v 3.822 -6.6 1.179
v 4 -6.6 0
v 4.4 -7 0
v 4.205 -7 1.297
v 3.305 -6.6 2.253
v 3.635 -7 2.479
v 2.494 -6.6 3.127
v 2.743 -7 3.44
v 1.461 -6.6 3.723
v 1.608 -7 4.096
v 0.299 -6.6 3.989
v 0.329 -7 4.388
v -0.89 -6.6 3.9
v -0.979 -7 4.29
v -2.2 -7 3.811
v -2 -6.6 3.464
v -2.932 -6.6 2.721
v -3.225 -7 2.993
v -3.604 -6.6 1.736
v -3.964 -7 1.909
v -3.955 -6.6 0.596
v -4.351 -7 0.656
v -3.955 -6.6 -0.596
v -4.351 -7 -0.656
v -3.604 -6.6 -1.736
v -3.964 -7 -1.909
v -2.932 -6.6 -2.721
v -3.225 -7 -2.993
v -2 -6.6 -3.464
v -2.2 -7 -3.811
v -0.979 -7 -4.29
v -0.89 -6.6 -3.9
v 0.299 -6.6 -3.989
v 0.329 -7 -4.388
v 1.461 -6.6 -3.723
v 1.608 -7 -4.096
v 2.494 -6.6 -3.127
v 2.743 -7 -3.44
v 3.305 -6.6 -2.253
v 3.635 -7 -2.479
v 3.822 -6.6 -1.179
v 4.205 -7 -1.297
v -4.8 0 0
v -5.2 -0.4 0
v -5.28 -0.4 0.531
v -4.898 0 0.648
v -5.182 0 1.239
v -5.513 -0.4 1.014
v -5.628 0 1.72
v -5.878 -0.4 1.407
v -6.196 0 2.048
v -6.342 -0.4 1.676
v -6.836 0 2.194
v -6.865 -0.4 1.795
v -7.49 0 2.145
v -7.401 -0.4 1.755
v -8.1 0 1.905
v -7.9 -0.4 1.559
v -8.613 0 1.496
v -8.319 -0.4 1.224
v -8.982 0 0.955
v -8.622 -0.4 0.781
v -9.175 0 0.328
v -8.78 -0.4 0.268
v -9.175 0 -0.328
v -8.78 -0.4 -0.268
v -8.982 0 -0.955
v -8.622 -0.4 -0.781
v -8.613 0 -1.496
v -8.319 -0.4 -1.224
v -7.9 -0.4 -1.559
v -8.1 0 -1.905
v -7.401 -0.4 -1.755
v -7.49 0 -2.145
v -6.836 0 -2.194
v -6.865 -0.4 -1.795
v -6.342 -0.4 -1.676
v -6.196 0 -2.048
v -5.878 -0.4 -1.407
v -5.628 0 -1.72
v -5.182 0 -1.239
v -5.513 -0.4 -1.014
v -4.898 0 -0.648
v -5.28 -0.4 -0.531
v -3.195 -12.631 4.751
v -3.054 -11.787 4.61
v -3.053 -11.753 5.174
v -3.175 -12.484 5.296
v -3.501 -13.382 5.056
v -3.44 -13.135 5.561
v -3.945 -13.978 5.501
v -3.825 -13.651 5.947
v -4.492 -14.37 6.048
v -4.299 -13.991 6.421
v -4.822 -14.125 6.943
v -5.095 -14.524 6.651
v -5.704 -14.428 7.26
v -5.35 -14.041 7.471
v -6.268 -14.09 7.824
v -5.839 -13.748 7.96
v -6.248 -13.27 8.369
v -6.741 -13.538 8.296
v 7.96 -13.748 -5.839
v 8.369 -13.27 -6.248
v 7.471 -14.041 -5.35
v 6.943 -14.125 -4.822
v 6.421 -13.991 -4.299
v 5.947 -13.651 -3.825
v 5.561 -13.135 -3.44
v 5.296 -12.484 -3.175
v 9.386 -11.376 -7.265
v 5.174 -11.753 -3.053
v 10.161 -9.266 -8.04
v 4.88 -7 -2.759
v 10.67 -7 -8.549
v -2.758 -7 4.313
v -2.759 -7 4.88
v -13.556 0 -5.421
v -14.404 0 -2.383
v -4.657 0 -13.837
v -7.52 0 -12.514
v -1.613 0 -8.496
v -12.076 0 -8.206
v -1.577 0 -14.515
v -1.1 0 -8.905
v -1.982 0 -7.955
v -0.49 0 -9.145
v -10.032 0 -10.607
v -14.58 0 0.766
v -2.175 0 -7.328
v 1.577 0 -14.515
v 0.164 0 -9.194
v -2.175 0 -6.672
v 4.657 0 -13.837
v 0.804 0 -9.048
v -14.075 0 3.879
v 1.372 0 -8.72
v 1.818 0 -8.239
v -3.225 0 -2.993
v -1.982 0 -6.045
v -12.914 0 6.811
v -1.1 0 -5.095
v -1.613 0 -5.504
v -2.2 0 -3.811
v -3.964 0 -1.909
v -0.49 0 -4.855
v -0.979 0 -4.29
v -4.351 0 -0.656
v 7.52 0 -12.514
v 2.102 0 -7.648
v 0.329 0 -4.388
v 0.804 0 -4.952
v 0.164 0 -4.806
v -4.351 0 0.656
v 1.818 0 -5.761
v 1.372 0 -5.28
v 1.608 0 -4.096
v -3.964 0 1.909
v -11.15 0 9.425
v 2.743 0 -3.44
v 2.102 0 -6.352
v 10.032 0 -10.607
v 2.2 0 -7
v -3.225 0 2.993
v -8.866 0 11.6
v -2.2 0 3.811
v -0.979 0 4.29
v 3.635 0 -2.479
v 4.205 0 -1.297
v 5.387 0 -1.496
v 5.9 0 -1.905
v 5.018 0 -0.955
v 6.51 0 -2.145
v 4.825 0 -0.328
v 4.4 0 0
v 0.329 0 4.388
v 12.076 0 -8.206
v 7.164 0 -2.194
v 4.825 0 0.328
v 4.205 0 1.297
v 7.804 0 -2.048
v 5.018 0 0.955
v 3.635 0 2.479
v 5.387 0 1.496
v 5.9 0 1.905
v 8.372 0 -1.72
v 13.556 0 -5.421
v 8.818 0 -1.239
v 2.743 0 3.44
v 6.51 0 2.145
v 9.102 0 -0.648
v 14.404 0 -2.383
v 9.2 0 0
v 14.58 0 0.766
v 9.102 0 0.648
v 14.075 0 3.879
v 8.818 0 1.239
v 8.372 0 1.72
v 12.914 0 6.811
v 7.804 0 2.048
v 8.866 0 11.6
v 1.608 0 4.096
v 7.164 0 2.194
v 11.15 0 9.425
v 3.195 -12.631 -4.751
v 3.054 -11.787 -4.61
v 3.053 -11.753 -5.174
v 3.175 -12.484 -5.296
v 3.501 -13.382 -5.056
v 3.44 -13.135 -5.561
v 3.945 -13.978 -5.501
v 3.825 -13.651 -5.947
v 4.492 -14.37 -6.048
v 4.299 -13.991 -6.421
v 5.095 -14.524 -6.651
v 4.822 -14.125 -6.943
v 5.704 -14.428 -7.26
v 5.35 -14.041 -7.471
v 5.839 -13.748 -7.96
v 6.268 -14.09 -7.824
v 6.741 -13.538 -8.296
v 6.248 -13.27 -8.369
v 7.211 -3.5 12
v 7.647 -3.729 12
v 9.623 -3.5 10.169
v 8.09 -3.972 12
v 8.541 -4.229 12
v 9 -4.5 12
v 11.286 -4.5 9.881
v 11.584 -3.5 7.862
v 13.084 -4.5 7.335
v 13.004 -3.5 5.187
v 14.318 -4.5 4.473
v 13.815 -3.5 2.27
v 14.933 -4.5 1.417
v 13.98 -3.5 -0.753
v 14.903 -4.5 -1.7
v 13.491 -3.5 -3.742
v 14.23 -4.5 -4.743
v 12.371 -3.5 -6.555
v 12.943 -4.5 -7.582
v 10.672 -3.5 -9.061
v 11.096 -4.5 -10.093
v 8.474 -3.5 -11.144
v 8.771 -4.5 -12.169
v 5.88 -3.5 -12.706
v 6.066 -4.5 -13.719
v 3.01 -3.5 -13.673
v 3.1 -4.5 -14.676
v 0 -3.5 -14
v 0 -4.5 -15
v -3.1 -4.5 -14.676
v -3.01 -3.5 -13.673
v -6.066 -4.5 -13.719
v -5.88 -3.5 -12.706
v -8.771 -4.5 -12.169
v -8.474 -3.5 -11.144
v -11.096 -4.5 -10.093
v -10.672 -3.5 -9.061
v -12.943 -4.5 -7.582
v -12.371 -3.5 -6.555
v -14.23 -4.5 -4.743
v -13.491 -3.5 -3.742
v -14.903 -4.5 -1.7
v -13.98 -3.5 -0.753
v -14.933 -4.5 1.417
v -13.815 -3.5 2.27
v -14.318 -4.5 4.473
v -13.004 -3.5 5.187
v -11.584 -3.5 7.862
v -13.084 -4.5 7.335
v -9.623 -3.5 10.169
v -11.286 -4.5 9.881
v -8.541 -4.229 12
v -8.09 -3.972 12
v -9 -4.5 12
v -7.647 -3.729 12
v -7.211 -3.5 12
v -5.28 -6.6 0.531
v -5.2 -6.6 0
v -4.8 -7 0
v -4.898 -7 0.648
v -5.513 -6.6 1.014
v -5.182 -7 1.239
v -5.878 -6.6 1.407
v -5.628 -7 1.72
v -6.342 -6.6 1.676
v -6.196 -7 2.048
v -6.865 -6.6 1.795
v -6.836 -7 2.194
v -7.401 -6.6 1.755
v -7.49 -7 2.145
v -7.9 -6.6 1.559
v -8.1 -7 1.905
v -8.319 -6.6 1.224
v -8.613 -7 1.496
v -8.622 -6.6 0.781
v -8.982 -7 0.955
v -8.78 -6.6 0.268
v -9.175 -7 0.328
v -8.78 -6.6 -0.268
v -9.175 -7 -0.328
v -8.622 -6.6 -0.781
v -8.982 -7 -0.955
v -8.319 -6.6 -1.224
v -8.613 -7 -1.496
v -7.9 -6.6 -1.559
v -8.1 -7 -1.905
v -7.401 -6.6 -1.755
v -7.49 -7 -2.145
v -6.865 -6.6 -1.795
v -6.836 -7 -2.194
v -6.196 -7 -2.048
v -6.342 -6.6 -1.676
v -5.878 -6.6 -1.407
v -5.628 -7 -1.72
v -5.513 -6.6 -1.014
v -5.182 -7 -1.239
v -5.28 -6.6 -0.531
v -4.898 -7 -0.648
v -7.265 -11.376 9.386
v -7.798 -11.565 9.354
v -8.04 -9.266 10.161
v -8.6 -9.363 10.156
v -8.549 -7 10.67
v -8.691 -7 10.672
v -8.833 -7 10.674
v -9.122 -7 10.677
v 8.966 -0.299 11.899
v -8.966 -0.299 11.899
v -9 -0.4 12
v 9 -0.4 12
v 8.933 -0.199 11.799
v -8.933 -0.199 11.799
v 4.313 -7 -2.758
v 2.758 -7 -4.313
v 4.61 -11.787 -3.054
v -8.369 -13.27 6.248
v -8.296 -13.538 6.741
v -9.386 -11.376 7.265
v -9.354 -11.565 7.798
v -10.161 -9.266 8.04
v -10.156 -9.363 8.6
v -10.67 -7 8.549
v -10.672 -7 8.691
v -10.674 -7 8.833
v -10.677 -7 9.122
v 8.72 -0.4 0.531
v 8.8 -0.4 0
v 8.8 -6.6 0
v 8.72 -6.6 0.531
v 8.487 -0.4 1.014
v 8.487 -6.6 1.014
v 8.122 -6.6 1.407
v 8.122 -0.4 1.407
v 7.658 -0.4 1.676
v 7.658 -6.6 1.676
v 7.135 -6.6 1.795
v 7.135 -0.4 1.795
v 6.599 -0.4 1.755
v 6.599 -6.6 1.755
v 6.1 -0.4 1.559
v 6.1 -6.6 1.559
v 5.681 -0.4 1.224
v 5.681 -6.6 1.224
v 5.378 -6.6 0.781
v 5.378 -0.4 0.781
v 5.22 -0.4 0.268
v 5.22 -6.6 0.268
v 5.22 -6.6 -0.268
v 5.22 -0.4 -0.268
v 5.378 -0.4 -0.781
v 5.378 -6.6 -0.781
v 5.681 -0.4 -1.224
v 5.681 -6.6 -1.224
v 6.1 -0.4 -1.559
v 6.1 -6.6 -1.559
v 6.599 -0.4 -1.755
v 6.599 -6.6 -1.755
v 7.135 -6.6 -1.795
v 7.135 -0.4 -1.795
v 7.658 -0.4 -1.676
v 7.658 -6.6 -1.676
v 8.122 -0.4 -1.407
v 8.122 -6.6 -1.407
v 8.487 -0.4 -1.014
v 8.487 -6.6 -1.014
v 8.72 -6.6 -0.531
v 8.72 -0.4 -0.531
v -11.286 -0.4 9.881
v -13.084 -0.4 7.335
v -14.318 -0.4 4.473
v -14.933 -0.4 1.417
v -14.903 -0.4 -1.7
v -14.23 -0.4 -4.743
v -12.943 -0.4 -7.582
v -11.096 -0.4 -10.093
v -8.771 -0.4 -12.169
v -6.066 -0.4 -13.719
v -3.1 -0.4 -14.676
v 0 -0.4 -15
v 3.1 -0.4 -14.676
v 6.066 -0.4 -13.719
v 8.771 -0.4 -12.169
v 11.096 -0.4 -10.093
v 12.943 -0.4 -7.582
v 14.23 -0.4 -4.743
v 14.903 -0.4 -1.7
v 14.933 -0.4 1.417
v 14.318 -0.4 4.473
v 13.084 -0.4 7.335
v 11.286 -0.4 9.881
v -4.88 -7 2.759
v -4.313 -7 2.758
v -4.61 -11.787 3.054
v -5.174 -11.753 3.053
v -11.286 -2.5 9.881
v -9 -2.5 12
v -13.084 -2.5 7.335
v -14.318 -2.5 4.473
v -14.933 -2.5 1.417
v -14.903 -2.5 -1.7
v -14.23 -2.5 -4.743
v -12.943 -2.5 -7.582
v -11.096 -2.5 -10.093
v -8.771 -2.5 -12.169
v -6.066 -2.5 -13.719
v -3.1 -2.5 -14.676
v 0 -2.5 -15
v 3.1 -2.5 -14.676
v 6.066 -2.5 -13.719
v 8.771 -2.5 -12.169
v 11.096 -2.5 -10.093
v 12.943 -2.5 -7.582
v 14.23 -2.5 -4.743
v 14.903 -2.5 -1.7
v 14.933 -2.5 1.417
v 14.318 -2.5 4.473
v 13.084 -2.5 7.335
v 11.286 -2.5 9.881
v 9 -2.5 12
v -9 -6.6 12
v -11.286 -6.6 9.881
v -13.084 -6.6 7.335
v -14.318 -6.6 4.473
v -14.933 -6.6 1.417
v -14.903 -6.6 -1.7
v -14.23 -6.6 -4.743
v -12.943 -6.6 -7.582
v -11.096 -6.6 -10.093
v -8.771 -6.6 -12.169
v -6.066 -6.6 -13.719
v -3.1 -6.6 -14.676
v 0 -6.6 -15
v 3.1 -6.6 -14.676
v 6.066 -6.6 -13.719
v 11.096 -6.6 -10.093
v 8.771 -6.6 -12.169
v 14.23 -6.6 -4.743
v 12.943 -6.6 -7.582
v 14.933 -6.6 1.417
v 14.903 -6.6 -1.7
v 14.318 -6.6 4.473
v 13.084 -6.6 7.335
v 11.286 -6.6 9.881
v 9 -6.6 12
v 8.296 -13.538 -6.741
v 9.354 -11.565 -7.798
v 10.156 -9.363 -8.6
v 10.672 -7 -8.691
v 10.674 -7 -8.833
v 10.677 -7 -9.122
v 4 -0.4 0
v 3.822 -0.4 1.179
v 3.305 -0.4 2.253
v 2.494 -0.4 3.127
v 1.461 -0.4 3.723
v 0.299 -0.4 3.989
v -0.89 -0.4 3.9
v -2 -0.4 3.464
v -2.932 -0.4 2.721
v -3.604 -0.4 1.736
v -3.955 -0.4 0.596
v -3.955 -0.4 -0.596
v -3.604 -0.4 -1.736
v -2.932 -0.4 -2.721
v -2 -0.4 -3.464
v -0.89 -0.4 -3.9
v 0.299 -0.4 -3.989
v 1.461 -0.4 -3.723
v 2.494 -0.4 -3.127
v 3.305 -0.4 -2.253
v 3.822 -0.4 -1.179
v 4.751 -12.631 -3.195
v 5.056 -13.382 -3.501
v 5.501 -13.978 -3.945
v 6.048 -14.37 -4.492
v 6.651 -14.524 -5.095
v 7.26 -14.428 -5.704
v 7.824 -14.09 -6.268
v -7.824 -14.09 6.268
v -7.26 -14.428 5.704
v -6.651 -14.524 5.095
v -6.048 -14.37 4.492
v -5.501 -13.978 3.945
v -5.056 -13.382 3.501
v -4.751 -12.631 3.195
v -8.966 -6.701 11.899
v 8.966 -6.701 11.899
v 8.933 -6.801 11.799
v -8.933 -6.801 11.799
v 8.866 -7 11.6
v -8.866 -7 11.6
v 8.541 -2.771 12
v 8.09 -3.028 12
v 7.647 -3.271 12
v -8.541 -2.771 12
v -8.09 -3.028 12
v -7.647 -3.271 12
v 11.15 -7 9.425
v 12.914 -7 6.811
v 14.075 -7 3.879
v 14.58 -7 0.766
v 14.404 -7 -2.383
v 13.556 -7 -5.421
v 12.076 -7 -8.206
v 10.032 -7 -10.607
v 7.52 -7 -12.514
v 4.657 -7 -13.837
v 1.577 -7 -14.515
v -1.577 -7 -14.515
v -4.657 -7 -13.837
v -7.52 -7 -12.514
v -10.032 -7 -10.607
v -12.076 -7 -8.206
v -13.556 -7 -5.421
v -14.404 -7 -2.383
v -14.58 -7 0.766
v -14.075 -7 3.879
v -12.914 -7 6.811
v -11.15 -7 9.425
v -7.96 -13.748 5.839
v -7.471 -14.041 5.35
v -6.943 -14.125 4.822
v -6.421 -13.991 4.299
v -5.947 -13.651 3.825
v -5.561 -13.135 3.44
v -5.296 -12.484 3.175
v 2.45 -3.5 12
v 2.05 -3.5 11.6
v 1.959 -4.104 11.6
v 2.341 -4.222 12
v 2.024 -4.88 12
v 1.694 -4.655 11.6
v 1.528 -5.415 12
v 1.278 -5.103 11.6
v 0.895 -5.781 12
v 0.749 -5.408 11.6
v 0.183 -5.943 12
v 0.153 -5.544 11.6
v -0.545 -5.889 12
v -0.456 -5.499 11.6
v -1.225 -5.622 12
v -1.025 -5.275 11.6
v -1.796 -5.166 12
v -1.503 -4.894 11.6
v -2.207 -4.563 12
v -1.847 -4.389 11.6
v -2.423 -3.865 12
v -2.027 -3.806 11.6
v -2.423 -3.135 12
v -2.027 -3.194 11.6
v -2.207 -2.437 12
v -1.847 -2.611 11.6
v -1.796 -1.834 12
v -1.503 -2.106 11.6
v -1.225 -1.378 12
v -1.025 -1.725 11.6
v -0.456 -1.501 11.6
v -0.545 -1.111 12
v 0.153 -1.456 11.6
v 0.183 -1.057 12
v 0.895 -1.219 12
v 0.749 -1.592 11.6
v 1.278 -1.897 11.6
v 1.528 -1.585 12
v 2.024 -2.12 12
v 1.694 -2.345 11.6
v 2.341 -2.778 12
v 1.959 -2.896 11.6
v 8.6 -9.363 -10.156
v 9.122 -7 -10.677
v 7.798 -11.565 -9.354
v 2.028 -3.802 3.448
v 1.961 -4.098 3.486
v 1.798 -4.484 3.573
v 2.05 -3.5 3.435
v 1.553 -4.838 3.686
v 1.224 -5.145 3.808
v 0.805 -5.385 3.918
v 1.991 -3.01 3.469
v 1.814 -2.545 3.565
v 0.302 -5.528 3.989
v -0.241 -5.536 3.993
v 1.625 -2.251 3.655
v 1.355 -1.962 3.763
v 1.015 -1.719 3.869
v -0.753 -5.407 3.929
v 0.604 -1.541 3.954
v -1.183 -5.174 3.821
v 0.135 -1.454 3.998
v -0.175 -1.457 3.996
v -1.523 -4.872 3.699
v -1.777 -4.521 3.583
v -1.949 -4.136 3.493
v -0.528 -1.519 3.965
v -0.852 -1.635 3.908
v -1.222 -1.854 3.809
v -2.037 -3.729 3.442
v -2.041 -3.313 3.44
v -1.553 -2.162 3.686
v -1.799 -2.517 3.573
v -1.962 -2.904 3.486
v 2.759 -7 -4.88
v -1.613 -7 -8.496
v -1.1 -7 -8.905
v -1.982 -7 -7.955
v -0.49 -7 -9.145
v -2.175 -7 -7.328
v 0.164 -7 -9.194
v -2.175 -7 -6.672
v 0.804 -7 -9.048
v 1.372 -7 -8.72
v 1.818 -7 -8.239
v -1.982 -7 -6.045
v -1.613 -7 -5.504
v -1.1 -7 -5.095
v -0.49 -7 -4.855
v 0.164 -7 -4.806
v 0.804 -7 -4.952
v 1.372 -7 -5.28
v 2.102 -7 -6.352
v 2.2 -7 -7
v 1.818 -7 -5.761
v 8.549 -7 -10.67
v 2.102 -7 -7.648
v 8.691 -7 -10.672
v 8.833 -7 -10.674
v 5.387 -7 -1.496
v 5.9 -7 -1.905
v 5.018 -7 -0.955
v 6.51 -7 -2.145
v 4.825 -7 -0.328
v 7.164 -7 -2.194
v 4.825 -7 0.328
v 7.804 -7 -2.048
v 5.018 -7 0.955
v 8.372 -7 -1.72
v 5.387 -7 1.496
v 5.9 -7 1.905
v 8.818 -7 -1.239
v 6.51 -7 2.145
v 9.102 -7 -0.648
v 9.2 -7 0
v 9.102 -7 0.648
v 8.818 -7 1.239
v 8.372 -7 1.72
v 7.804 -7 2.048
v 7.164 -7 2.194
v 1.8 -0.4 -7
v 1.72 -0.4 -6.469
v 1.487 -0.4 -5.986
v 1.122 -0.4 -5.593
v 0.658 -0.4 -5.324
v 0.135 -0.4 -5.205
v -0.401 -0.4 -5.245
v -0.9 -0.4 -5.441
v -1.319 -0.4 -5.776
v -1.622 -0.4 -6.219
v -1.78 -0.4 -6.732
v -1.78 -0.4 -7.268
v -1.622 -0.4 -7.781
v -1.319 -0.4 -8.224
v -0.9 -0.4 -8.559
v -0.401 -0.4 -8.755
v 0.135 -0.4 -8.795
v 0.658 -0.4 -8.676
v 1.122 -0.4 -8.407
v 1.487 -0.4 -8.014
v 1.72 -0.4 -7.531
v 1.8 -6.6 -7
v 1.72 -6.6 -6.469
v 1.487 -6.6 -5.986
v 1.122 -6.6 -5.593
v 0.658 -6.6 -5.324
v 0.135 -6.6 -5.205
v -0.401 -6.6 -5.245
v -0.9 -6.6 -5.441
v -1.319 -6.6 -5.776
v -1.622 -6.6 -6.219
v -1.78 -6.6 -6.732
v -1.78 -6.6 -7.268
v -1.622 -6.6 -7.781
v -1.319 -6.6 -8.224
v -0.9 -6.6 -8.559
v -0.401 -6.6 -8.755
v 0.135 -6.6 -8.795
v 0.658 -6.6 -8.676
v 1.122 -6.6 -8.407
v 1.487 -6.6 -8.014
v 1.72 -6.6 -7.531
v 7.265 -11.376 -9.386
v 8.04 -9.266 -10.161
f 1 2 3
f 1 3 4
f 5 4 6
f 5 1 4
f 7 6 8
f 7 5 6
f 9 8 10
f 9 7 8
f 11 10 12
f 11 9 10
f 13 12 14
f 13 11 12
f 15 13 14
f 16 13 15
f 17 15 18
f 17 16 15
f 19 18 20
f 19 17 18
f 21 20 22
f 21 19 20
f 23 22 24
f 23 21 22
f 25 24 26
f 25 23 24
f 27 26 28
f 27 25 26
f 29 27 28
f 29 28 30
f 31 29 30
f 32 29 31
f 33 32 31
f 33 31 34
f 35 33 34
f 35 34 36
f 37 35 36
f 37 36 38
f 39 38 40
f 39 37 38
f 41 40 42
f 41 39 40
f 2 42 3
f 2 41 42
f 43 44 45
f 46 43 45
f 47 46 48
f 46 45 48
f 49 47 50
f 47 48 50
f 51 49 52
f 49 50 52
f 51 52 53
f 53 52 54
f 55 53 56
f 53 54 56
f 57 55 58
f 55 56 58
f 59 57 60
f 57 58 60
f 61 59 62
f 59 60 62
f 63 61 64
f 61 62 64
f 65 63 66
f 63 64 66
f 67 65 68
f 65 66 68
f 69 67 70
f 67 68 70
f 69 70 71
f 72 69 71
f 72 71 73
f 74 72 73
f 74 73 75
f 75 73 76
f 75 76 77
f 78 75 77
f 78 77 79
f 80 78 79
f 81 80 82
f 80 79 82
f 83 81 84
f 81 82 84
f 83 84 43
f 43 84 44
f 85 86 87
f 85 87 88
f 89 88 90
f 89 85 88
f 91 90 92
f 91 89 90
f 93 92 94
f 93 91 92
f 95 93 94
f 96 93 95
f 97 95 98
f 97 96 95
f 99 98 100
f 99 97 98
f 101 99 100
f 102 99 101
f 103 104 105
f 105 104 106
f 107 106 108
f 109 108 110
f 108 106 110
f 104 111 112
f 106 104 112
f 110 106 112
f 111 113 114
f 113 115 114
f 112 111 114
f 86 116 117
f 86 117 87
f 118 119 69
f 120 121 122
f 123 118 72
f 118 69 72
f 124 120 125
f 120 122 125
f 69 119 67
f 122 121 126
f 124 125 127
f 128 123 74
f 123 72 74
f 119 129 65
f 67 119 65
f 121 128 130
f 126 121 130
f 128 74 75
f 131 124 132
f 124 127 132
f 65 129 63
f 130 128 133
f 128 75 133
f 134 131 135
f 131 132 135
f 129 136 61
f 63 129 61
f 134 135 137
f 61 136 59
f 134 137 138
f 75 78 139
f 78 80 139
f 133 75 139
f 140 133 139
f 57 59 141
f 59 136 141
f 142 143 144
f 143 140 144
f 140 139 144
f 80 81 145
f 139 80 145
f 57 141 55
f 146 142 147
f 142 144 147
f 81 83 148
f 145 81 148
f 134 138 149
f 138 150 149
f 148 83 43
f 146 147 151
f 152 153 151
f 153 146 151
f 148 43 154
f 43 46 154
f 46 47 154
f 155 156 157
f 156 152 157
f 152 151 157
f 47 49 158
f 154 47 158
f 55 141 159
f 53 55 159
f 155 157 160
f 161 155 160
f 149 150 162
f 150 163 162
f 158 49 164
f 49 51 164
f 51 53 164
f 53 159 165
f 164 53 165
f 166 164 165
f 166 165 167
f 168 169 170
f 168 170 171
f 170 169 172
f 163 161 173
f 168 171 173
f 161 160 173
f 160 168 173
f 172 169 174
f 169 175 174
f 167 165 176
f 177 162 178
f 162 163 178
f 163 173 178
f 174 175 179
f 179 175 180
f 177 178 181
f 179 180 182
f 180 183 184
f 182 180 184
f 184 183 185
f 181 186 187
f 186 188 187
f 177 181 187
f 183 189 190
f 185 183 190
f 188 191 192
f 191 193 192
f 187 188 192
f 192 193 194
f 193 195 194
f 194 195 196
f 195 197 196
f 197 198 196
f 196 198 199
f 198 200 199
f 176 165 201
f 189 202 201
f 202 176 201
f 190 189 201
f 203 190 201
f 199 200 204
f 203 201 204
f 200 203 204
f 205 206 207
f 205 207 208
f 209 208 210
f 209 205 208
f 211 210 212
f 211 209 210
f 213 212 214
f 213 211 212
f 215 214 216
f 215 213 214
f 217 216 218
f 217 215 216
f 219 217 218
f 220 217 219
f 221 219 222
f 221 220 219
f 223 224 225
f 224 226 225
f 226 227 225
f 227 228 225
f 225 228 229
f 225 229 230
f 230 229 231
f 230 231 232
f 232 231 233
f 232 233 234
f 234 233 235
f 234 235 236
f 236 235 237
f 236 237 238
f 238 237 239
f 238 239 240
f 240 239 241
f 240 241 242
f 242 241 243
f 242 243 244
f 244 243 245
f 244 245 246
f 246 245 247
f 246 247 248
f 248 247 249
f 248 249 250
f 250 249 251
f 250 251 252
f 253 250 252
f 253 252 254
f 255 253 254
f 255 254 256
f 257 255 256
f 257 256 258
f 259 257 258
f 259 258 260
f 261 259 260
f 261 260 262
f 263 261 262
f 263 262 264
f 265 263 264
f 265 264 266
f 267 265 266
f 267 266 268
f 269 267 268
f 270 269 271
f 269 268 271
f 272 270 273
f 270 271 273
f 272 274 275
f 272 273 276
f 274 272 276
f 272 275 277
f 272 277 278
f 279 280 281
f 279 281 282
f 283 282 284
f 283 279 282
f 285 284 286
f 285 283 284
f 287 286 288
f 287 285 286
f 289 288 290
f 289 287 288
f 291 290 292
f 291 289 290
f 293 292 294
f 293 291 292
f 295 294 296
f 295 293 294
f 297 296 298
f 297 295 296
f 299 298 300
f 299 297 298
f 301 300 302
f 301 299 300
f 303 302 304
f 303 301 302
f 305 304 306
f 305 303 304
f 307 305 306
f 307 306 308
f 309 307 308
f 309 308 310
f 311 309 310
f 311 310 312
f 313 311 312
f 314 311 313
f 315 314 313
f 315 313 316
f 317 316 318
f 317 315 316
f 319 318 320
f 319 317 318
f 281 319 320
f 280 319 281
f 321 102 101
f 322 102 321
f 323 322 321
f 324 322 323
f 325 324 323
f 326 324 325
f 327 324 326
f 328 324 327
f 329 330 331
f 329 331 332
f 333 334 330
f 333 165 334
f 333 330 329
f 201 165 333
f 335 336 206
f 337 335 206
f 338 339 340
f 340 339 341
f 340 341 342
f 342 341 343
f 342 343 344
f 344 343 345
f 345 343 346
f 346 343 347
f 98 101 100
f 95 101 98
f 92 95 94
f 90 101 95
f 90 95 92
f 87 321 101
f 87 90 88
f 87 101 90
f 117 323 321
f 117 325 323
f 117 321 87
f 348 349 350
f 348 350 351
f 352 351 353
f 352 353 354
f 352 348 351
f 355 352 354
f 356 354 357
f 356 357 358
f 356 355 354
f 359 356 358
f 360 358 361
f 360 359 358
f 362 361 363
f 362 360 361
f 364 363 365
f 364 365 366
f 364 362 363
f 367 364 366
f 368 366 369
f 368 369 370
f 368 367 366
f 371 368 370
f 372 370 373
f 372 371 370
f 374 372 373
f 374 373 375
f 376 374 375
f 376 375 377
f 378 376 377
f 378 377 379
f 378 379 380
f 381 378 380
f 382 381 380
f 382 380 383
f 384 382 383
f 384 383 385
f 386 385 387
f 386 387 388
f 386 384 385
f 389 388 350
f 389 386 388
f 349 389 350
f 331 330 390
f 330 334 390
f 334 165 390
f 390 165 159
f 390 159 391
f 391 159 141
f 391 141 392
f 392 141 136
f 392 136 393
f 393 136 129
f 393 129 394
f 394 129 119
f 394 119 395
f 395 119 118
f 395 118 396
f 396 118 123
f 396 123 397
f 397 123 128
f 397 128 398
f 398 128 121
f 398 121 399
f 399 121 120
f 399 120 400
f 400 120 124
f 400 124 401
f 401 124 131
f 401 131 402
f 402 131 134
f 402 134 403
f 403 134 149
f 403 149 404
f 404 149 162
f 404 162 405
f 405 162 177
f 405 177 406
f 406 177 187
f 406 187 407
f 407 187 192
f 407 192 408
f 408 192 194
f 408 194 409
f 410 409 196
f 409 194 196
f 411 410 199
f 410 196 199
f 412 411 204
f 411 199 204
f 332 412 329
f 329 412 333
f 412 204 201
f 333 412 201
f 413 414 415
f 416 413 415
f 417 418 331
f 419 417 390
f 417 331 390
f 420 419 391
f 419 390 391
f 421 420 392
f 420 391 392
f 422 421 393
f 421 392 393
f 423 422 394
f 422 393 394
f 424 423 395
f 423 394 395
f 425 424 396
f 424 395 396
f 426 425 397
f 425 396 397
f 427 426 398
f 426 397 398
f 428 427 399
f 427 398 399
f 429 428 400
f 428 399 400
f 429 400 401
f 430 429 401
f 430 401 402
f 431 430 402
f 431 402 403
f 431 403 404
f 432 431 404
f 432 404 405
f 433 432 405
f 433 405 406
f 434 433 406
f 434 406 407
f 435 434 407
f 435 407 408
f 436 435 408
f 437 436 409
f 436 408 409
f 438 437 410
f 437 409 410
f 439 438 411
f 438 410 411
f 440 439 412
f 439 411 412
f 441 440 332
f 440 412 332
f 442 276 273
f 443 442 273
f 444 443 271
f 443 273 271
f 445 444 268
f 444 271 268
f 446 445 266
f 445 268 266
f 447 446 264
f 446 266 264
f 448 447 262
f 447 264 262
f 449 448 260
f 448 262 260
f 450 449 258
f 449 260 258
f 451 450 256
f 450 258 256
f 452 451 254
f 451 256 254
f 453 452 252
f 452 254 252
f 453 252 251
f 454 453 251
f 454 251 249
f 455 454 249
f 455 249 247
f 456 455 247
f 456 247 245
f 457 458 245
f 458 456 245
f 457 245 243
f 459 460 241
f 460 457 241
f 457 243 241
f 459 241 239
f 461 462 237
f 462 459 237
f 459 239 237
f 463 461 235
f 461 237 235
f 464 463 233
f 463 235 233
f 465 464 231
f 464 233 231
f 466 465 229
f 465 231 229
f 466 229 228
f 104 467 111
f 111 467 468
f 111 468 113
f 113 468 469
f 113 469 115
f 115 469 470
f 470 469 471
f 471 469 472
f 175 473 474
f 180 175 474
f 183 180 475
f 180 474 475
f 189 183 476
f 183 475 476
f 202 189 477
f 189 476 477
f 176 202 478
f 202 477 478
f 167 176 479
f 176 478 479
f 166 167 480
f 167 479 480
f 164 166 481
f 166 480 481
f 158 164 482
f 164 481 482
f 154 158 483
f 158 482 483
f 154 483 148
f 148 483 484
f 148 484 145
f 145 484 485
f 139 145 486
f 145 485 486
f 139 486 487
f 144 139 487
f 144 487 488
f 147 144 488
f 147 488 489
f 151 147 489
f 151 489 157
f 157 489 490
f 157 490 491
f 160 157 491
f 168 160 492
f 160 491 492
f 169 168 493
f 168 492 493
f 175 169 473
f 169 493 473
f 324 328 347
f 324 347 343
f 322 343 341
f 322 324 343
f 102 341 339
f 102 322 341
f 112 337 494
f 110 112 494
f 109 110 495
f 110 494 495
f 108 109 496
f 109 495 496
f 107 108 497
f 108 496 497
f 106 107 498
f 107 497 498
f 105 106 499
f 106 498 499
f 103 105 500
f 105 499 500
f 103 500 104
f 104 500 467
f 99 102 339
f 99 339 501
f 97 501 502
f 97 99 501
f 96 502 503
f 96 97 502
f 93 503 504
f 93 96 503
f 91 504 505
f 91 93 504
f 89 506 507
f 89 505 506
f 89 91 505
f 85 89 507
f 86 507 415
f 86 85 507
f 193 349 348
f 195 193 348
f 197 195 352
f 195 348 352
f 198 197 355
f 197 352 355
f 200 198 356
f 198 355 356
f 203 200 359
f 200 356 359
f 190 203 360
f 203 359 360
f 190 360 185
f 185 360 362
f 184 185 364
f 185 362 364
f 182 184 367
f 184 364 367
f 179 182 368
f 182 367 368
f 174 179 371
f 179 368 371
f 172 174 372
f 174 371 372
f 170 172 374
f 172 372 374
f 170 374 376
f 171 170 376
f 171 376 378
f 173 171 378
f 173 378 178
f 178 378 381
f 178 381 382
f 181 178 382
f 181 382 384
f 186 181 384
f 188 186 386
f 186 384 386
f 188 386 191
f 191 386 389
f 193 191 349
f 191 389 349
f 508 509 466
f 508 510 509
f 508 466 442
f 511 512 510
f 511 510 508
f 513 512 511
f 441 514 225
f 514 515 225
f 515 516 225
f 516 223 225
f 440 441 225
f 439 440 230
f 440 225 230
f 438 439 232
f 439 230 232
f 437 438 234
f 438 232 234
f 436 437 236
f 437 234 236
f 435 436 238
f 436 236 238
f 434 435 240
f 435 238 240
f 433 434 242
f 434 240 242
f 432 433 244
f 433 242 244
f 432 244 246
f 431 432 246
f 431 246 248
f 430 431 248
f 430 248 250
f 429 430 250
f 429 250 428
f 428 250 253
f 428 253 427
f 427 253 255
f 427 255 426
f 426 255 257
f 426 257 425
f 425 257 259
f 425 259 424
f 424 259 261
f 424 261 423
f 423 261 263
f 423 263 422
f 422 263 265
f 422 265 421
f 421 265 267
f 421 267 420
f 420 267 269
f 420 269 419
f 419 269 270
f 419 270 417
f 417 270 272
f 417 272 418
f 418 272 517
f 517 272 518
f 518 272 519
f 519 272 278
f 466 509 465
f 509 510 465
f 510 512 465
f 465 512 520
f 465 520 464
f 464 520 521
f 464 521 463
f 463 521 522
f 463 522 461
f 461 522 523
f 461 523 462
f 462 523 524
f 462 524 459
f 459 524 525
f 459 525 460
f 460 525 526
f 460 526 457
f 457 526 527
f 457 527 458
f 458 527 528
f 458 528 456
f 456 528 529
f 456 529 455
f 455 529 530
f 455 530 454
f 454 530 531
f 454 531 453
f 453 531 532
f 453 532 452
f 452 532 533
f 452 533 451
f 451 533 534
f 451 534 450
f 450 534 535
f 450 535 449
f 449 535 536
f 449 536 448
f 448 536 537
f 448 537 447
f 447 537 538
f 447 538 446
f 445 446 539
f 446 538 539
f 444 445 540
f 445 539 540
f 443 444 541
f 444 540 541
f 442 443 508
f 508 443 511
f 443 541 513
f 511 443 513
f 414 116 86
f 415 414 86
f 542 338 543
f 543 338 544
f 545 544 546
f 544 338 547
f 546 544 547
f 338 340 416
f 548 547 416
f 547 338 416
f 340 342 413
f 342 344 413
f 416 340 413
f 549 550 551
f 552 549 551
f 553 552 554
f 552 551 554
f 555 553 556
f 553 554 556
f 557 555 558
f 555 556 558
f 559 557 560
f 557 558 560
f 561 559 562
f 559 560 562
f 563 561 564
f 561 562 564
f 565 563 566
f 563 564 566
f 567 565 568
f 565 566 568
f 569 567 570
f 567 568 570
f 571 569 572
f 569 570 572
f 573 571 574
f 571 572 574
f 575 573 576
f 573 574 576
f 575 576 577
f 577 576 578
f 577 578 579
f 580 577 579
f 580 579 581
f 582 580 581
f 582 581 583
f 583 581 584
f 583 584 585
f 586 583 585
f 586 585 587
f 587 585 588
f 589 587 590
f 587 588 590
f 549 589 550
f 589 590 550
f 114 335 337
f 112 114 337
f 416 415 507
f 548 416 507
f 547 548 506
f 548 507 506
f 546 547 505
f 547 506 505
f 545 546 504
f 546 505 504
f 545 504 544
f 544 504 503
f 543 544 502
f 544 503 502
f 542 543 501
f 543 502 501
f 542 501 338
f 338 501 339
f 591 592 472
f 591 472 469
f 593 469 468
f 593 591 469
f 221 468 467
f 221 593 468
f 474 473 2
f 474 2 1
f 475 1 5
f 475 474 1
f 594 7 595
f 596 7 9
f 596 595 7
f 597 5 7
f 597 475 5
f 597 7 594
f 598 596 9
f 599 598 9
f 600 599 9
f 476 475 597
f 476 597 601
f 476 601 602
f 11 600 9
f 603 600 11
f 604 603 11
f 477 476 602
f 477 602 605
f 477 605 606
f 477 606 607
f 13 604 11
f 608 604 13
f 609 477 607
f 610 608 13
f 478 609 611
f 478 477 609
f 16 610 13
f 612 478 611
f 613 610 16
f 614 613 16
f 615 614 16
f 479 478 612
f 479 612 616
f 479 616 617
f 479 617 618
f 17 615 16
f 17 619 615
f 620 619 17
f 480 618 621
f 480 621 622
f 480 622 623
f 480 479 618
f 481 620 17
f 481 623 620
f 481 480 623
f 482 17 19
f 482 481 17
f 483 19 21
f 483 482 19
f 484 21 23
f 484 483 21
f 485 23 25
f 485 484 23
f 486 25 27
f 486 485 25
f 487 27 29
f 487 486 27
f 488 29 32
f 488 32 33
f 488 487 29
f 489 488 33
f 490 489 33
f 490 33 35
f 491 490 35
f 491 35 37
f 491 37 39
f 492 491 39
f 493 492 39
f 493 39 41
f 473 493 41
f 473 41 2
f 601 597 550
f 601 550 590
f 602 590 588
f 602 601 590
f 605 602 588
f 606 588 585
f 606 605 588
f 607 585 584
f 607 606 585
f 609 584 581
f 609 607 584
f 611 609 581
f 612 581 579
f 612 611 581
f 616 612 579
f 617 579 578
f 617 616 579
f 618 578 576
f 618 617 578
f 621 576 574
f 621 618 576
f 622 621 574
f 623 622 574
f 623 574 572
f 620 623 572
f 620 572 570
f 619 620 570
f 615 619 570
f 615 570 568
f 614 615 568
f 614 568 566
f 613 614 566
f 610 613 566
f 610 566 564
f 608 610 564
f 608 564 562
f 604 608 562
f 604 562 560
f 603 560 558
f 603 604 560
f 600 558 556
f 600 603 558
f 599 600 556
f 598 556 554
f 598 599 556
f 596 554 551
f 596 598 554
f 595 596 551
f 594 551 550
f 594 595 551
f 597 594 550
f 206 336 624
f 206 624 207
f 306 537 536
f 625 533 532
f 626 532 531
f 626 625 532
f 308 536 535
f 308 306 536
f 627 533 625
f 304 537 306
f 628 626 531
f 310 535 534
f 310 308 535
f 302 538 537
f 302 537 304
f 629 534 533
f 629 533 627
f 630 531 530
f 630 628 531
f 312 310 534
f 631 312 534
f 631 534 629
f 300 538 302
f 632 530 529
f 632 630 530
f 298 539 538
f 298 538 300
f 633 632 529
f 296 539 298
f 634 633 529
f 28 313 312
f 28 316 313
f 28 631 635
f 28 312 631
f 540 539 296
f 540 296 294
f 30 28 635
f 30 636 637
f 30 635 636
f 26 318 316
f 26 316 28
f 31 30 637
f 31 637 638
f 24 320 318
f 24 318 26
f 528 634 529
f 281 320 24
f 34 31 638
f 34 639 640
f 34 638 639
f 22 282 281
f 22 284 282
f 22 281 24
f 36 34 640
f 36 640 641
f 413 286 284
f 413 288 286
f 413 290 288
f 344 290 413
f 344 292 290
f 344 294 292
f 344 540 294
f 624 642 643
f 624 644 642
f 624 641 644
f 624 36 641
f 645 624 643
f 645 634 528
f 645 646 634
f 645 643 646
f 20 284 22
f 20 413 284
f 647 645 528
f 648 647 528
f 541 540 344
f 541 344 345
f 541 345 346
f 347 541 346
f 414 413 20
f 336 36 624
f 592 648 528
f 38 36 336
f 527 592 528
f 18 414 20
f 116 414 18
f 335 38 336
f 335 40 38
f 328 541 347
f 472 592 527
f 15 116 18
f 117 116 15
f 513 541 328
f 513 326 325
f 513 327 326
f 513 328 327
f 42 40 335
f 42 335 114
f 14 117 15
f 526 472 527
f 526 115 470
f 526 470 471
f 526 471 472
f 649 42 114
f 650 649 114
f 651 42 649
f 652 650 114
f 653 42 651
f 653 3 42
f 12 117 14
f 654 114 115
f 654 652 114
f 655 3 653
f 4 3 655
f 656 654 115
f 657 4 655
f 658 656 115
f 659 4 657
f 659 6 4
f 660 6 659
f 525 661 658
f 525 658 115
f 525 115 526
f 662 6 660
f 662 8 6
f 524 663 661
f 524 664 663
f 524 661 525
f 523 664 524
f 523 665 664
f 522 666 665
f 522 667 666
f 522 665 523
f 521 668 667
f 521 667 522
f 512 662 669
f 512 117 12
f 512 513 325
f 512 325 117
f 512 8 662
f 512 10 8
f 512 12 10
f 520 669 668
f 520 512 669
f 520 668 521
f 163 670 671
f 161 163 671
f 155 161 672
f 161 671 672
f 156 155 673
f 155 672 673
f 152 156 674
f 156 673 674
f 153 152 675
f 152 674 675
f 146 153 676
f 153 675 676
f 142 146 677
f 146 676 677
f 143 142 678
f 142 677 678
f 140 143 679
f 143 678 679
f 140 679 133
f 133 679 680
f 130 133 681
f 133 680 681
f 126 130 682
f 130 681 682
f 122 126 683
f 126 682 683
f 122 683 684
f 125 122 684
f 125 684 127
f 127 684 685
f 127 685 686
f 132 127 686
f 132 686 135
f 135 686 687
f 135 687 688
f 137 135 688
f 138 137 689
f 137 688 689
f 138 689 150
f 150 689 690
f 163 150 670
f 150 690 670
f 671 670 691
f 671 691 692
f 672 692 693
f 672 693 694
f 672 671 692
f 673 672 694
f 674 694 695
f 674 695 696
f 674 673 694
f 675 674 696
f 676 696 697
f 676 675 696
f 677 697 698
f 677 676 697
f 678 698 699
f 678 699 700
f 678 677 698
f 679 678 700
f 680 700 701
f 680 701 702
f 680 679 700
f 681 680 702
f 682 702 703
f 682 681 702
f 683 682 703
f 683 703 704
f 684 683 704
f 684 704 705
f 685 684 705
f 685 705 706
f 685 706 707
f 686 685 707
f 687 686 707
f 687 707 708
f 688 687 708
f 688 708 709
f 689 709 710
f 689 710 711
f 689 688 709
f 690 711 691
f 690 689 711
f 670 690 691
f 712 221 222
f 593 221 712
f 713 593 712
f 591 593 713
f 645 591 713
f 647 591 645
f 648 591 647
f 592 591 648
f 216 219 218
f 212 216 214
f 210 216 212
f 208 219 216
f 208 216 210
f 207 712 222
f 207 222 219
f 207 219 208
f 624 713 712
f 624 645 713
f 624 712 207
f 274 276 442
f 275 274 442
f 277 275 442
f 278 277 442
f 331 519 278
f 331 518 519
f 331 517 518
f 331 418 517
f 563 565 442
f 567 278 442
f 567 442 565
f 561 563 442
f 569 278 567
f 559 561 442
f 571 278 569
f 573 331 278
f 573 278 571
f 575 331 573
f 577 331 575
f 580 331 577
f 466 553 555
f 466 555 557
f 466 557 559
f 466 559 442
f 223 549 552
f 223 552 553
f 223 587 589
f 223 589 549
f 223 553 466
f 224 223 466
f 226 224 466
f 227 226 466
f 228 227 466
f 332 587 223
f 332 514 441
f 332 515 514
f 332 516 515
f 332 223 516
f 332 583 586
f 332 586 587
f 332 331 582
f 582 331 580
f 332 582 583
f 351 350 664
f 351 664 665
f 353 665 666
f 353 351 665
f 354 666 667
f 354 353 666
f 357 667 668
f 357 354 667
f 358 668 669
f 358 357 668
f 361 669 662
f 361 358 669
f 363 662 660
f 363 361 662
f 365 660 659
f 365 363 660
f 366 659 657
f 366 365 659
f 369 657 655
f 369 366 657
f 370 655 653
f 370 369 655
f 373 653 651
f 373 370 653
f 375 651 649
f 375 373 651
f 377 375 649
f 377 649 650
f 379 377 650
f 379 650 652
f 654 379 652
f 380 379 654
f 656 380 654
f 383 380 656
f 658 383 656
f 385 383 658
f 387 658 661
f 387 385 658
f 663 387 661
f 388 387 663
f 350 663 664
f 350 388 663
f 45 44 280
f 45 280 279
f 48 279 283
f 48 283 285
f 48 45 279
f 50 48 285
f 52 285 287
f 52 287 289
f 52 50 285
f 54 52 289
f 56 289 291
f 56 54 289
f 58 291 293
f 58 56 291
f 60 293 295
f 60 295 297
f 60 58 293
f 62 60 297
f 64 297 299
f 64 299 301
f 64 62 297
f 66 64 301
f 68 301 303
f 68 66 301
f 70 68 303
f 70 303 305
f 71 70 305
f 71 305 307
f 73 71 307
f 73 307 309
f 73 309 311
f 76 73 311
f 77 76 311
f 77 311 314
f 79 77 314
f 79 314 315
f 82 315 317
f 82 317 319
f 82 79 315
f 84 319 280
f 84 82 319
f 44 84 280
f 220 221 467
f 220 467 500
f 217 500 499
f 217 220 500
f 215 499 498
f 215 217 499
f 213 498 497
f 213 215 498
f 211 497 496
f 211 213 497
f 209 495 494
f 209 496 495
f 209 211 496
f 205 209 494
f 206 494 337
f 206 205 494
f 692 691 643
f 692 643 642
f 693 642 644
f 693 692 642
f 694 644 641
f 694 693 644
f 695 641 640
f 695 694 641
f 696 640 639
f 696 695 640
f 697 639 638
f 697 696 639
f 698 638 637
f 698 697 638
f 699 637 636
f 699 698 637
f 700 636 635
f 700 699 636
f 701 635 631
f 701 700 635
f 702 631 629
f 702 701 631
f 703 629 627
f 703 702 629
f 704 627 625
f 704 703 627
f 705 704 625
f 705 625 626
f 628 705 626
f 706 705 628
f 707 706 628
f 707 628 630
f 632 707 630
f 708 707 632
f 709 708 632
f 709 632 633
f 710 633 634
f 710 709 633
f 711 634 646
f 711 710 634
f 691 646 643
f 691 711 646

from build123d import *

# Parameters (mm, degrees)
SKETCH017_R        = 15
SKETCH017_R_2      = 4
SKETCH017_R_3      = 1.8
PAD005_DEPTH       = 7
SKETCH020_W        = 18
SKETCH020_H        = 3
POCKET010_DEPTH    = 7.001
SKETCH021_R        = 2.05
POCKET011_DEPTH    = 12.001
CHAMFER009_SIZE    = 0.4
PAD023_DEPTH       = 1.5
POLARPATTERN_COUNT = 2
FILLET020_R        = 3
CHAMFER037_SIZE    = 0.4


with BuildPart() as part:
    # Sketch017 → Pad005 (new body)
    with BuildSketch(Plane.XZ):
        Circle(SKETCH017_R)
        Circle(SKETCH017_R_2, mode=Mode.SUBTRACT)
        with Locations((-7, 0)):
            Circle(SKETCH017_R_3, mode=Mode.SUBTRACT)
        with Locations((0, -7)):
            Circle(SKETCH017_R_3, mode=Mode.SUBTRACT)
        with Locations((7, 0)):
            Circle(SKETCH017_R_3, mode=Mode.SUBTRACT)
    extrude(amount=PAD005_DEPTH)

    # Sketch018 → Groove (revolve, cut)
    with BuildSketch(Plane.XY):
        Polygon((15, -2.5), (14, -3.5), (15, -4.5), align=None)
    revolve(axis=Axis((0, 0, 0), (0, 1, 0)), mode=Mode.SUBTRACT)

    # Sketch020 → Pocket010 (cut, through all)
    with BuildSketch(Plane.XZ):
        with Locations((0, 13.5)):
            Rectangle(SKETCH020_W, SKETCH020_H)
    extrude(amount=POCKET010_DEPTH, mode=Mode.SUBTRACT)

    # Sketch021 → Pocket011 (cut, through all)
    with BuildSketch(Plane.XY):
        with Locations((0, -3.5)):
            Circle(SKETCH021_R)
    extrude(amount=POCKET011_DEPTH, mode=Mode.SUBTRACT)

    # Chamfer009
    chamfer009_edges = [part.edges().sort_by_distance(p)[0] for p in [
        (-2.05, -3.5, 12),
        (13.416408, 0, 6.708204),
        (0, 0, 12),
        (-6.708204, 0, -13.416408),
        (-8.8, 0, 0),
        (-1.8, 0, -7),
        (-4, 0, 0),
        (5.2, 0, 0),
        (13.416408, -7, 6.708204),
        (0, -7, 12),
        (-6.708204, -7, -13.416408),
        (-8.8, -7, 0),
        (-1.8, -7, -7),
        (-4, -7, 0),
        (5.2, -7, 0),
    ]]
    chamfer(chamfer009_edges, length=CHAMFER009_SIZE)

    # Sketch055 (on Plane of DatumPlane001) → Pad023 (join, symmetric)
    with BuildSketch(Plane(origin=(0, 0, 0), x_dir=(0.707107, 0, -0.707107), z_dir=(0.707107, 0, 0.707107))):
        with BuildLine():
            ThreePointArc((-14, -7), (-11.124423, -12.964434), (-5.874887, -17))
            Line((-5, -7), (-5.874887, -17))
            Line((-14, -7), (-5, -7))
        make_face()
    pad023 = extrude(amount=PAD023_DEPTH, both=True)

    # PolarPattern: Pad023 ×2 about axis
    polarpattern_axis = Axis((0, 0, 0), (0, 1, 0))
    for i in range(1, POLARPATTERN_COUNT):
        add(pad023.rotate(polarpattern_axis, i * 360 / POLARPATTERN_COUNT))

    # Fillet020
    fillet020_edges = [part.edges().sort_by_distance(p)[0] for p in [
        (-4.154172, -17, 4.154172),
        (4.154172, -17, -4.154172),
    ]]
    fillet(fillet020_edges, radius=FILLET020_R)

    # Chamfer037
    chamfer037_edges = [part.edges().sort_by_distance(p)[0] for p in [
        (2.62296, -9.39375, -4.744281),
        (4.744281, -9.39375, -2.62296),
        (-4.744281, -9.39375, 2.62296),
        (-2.62296, -9.39375, 4.744281),
    ]]
    chamfer(chamfer037_edges, length=CHAMFER037_SIZE)


solid = part.part
